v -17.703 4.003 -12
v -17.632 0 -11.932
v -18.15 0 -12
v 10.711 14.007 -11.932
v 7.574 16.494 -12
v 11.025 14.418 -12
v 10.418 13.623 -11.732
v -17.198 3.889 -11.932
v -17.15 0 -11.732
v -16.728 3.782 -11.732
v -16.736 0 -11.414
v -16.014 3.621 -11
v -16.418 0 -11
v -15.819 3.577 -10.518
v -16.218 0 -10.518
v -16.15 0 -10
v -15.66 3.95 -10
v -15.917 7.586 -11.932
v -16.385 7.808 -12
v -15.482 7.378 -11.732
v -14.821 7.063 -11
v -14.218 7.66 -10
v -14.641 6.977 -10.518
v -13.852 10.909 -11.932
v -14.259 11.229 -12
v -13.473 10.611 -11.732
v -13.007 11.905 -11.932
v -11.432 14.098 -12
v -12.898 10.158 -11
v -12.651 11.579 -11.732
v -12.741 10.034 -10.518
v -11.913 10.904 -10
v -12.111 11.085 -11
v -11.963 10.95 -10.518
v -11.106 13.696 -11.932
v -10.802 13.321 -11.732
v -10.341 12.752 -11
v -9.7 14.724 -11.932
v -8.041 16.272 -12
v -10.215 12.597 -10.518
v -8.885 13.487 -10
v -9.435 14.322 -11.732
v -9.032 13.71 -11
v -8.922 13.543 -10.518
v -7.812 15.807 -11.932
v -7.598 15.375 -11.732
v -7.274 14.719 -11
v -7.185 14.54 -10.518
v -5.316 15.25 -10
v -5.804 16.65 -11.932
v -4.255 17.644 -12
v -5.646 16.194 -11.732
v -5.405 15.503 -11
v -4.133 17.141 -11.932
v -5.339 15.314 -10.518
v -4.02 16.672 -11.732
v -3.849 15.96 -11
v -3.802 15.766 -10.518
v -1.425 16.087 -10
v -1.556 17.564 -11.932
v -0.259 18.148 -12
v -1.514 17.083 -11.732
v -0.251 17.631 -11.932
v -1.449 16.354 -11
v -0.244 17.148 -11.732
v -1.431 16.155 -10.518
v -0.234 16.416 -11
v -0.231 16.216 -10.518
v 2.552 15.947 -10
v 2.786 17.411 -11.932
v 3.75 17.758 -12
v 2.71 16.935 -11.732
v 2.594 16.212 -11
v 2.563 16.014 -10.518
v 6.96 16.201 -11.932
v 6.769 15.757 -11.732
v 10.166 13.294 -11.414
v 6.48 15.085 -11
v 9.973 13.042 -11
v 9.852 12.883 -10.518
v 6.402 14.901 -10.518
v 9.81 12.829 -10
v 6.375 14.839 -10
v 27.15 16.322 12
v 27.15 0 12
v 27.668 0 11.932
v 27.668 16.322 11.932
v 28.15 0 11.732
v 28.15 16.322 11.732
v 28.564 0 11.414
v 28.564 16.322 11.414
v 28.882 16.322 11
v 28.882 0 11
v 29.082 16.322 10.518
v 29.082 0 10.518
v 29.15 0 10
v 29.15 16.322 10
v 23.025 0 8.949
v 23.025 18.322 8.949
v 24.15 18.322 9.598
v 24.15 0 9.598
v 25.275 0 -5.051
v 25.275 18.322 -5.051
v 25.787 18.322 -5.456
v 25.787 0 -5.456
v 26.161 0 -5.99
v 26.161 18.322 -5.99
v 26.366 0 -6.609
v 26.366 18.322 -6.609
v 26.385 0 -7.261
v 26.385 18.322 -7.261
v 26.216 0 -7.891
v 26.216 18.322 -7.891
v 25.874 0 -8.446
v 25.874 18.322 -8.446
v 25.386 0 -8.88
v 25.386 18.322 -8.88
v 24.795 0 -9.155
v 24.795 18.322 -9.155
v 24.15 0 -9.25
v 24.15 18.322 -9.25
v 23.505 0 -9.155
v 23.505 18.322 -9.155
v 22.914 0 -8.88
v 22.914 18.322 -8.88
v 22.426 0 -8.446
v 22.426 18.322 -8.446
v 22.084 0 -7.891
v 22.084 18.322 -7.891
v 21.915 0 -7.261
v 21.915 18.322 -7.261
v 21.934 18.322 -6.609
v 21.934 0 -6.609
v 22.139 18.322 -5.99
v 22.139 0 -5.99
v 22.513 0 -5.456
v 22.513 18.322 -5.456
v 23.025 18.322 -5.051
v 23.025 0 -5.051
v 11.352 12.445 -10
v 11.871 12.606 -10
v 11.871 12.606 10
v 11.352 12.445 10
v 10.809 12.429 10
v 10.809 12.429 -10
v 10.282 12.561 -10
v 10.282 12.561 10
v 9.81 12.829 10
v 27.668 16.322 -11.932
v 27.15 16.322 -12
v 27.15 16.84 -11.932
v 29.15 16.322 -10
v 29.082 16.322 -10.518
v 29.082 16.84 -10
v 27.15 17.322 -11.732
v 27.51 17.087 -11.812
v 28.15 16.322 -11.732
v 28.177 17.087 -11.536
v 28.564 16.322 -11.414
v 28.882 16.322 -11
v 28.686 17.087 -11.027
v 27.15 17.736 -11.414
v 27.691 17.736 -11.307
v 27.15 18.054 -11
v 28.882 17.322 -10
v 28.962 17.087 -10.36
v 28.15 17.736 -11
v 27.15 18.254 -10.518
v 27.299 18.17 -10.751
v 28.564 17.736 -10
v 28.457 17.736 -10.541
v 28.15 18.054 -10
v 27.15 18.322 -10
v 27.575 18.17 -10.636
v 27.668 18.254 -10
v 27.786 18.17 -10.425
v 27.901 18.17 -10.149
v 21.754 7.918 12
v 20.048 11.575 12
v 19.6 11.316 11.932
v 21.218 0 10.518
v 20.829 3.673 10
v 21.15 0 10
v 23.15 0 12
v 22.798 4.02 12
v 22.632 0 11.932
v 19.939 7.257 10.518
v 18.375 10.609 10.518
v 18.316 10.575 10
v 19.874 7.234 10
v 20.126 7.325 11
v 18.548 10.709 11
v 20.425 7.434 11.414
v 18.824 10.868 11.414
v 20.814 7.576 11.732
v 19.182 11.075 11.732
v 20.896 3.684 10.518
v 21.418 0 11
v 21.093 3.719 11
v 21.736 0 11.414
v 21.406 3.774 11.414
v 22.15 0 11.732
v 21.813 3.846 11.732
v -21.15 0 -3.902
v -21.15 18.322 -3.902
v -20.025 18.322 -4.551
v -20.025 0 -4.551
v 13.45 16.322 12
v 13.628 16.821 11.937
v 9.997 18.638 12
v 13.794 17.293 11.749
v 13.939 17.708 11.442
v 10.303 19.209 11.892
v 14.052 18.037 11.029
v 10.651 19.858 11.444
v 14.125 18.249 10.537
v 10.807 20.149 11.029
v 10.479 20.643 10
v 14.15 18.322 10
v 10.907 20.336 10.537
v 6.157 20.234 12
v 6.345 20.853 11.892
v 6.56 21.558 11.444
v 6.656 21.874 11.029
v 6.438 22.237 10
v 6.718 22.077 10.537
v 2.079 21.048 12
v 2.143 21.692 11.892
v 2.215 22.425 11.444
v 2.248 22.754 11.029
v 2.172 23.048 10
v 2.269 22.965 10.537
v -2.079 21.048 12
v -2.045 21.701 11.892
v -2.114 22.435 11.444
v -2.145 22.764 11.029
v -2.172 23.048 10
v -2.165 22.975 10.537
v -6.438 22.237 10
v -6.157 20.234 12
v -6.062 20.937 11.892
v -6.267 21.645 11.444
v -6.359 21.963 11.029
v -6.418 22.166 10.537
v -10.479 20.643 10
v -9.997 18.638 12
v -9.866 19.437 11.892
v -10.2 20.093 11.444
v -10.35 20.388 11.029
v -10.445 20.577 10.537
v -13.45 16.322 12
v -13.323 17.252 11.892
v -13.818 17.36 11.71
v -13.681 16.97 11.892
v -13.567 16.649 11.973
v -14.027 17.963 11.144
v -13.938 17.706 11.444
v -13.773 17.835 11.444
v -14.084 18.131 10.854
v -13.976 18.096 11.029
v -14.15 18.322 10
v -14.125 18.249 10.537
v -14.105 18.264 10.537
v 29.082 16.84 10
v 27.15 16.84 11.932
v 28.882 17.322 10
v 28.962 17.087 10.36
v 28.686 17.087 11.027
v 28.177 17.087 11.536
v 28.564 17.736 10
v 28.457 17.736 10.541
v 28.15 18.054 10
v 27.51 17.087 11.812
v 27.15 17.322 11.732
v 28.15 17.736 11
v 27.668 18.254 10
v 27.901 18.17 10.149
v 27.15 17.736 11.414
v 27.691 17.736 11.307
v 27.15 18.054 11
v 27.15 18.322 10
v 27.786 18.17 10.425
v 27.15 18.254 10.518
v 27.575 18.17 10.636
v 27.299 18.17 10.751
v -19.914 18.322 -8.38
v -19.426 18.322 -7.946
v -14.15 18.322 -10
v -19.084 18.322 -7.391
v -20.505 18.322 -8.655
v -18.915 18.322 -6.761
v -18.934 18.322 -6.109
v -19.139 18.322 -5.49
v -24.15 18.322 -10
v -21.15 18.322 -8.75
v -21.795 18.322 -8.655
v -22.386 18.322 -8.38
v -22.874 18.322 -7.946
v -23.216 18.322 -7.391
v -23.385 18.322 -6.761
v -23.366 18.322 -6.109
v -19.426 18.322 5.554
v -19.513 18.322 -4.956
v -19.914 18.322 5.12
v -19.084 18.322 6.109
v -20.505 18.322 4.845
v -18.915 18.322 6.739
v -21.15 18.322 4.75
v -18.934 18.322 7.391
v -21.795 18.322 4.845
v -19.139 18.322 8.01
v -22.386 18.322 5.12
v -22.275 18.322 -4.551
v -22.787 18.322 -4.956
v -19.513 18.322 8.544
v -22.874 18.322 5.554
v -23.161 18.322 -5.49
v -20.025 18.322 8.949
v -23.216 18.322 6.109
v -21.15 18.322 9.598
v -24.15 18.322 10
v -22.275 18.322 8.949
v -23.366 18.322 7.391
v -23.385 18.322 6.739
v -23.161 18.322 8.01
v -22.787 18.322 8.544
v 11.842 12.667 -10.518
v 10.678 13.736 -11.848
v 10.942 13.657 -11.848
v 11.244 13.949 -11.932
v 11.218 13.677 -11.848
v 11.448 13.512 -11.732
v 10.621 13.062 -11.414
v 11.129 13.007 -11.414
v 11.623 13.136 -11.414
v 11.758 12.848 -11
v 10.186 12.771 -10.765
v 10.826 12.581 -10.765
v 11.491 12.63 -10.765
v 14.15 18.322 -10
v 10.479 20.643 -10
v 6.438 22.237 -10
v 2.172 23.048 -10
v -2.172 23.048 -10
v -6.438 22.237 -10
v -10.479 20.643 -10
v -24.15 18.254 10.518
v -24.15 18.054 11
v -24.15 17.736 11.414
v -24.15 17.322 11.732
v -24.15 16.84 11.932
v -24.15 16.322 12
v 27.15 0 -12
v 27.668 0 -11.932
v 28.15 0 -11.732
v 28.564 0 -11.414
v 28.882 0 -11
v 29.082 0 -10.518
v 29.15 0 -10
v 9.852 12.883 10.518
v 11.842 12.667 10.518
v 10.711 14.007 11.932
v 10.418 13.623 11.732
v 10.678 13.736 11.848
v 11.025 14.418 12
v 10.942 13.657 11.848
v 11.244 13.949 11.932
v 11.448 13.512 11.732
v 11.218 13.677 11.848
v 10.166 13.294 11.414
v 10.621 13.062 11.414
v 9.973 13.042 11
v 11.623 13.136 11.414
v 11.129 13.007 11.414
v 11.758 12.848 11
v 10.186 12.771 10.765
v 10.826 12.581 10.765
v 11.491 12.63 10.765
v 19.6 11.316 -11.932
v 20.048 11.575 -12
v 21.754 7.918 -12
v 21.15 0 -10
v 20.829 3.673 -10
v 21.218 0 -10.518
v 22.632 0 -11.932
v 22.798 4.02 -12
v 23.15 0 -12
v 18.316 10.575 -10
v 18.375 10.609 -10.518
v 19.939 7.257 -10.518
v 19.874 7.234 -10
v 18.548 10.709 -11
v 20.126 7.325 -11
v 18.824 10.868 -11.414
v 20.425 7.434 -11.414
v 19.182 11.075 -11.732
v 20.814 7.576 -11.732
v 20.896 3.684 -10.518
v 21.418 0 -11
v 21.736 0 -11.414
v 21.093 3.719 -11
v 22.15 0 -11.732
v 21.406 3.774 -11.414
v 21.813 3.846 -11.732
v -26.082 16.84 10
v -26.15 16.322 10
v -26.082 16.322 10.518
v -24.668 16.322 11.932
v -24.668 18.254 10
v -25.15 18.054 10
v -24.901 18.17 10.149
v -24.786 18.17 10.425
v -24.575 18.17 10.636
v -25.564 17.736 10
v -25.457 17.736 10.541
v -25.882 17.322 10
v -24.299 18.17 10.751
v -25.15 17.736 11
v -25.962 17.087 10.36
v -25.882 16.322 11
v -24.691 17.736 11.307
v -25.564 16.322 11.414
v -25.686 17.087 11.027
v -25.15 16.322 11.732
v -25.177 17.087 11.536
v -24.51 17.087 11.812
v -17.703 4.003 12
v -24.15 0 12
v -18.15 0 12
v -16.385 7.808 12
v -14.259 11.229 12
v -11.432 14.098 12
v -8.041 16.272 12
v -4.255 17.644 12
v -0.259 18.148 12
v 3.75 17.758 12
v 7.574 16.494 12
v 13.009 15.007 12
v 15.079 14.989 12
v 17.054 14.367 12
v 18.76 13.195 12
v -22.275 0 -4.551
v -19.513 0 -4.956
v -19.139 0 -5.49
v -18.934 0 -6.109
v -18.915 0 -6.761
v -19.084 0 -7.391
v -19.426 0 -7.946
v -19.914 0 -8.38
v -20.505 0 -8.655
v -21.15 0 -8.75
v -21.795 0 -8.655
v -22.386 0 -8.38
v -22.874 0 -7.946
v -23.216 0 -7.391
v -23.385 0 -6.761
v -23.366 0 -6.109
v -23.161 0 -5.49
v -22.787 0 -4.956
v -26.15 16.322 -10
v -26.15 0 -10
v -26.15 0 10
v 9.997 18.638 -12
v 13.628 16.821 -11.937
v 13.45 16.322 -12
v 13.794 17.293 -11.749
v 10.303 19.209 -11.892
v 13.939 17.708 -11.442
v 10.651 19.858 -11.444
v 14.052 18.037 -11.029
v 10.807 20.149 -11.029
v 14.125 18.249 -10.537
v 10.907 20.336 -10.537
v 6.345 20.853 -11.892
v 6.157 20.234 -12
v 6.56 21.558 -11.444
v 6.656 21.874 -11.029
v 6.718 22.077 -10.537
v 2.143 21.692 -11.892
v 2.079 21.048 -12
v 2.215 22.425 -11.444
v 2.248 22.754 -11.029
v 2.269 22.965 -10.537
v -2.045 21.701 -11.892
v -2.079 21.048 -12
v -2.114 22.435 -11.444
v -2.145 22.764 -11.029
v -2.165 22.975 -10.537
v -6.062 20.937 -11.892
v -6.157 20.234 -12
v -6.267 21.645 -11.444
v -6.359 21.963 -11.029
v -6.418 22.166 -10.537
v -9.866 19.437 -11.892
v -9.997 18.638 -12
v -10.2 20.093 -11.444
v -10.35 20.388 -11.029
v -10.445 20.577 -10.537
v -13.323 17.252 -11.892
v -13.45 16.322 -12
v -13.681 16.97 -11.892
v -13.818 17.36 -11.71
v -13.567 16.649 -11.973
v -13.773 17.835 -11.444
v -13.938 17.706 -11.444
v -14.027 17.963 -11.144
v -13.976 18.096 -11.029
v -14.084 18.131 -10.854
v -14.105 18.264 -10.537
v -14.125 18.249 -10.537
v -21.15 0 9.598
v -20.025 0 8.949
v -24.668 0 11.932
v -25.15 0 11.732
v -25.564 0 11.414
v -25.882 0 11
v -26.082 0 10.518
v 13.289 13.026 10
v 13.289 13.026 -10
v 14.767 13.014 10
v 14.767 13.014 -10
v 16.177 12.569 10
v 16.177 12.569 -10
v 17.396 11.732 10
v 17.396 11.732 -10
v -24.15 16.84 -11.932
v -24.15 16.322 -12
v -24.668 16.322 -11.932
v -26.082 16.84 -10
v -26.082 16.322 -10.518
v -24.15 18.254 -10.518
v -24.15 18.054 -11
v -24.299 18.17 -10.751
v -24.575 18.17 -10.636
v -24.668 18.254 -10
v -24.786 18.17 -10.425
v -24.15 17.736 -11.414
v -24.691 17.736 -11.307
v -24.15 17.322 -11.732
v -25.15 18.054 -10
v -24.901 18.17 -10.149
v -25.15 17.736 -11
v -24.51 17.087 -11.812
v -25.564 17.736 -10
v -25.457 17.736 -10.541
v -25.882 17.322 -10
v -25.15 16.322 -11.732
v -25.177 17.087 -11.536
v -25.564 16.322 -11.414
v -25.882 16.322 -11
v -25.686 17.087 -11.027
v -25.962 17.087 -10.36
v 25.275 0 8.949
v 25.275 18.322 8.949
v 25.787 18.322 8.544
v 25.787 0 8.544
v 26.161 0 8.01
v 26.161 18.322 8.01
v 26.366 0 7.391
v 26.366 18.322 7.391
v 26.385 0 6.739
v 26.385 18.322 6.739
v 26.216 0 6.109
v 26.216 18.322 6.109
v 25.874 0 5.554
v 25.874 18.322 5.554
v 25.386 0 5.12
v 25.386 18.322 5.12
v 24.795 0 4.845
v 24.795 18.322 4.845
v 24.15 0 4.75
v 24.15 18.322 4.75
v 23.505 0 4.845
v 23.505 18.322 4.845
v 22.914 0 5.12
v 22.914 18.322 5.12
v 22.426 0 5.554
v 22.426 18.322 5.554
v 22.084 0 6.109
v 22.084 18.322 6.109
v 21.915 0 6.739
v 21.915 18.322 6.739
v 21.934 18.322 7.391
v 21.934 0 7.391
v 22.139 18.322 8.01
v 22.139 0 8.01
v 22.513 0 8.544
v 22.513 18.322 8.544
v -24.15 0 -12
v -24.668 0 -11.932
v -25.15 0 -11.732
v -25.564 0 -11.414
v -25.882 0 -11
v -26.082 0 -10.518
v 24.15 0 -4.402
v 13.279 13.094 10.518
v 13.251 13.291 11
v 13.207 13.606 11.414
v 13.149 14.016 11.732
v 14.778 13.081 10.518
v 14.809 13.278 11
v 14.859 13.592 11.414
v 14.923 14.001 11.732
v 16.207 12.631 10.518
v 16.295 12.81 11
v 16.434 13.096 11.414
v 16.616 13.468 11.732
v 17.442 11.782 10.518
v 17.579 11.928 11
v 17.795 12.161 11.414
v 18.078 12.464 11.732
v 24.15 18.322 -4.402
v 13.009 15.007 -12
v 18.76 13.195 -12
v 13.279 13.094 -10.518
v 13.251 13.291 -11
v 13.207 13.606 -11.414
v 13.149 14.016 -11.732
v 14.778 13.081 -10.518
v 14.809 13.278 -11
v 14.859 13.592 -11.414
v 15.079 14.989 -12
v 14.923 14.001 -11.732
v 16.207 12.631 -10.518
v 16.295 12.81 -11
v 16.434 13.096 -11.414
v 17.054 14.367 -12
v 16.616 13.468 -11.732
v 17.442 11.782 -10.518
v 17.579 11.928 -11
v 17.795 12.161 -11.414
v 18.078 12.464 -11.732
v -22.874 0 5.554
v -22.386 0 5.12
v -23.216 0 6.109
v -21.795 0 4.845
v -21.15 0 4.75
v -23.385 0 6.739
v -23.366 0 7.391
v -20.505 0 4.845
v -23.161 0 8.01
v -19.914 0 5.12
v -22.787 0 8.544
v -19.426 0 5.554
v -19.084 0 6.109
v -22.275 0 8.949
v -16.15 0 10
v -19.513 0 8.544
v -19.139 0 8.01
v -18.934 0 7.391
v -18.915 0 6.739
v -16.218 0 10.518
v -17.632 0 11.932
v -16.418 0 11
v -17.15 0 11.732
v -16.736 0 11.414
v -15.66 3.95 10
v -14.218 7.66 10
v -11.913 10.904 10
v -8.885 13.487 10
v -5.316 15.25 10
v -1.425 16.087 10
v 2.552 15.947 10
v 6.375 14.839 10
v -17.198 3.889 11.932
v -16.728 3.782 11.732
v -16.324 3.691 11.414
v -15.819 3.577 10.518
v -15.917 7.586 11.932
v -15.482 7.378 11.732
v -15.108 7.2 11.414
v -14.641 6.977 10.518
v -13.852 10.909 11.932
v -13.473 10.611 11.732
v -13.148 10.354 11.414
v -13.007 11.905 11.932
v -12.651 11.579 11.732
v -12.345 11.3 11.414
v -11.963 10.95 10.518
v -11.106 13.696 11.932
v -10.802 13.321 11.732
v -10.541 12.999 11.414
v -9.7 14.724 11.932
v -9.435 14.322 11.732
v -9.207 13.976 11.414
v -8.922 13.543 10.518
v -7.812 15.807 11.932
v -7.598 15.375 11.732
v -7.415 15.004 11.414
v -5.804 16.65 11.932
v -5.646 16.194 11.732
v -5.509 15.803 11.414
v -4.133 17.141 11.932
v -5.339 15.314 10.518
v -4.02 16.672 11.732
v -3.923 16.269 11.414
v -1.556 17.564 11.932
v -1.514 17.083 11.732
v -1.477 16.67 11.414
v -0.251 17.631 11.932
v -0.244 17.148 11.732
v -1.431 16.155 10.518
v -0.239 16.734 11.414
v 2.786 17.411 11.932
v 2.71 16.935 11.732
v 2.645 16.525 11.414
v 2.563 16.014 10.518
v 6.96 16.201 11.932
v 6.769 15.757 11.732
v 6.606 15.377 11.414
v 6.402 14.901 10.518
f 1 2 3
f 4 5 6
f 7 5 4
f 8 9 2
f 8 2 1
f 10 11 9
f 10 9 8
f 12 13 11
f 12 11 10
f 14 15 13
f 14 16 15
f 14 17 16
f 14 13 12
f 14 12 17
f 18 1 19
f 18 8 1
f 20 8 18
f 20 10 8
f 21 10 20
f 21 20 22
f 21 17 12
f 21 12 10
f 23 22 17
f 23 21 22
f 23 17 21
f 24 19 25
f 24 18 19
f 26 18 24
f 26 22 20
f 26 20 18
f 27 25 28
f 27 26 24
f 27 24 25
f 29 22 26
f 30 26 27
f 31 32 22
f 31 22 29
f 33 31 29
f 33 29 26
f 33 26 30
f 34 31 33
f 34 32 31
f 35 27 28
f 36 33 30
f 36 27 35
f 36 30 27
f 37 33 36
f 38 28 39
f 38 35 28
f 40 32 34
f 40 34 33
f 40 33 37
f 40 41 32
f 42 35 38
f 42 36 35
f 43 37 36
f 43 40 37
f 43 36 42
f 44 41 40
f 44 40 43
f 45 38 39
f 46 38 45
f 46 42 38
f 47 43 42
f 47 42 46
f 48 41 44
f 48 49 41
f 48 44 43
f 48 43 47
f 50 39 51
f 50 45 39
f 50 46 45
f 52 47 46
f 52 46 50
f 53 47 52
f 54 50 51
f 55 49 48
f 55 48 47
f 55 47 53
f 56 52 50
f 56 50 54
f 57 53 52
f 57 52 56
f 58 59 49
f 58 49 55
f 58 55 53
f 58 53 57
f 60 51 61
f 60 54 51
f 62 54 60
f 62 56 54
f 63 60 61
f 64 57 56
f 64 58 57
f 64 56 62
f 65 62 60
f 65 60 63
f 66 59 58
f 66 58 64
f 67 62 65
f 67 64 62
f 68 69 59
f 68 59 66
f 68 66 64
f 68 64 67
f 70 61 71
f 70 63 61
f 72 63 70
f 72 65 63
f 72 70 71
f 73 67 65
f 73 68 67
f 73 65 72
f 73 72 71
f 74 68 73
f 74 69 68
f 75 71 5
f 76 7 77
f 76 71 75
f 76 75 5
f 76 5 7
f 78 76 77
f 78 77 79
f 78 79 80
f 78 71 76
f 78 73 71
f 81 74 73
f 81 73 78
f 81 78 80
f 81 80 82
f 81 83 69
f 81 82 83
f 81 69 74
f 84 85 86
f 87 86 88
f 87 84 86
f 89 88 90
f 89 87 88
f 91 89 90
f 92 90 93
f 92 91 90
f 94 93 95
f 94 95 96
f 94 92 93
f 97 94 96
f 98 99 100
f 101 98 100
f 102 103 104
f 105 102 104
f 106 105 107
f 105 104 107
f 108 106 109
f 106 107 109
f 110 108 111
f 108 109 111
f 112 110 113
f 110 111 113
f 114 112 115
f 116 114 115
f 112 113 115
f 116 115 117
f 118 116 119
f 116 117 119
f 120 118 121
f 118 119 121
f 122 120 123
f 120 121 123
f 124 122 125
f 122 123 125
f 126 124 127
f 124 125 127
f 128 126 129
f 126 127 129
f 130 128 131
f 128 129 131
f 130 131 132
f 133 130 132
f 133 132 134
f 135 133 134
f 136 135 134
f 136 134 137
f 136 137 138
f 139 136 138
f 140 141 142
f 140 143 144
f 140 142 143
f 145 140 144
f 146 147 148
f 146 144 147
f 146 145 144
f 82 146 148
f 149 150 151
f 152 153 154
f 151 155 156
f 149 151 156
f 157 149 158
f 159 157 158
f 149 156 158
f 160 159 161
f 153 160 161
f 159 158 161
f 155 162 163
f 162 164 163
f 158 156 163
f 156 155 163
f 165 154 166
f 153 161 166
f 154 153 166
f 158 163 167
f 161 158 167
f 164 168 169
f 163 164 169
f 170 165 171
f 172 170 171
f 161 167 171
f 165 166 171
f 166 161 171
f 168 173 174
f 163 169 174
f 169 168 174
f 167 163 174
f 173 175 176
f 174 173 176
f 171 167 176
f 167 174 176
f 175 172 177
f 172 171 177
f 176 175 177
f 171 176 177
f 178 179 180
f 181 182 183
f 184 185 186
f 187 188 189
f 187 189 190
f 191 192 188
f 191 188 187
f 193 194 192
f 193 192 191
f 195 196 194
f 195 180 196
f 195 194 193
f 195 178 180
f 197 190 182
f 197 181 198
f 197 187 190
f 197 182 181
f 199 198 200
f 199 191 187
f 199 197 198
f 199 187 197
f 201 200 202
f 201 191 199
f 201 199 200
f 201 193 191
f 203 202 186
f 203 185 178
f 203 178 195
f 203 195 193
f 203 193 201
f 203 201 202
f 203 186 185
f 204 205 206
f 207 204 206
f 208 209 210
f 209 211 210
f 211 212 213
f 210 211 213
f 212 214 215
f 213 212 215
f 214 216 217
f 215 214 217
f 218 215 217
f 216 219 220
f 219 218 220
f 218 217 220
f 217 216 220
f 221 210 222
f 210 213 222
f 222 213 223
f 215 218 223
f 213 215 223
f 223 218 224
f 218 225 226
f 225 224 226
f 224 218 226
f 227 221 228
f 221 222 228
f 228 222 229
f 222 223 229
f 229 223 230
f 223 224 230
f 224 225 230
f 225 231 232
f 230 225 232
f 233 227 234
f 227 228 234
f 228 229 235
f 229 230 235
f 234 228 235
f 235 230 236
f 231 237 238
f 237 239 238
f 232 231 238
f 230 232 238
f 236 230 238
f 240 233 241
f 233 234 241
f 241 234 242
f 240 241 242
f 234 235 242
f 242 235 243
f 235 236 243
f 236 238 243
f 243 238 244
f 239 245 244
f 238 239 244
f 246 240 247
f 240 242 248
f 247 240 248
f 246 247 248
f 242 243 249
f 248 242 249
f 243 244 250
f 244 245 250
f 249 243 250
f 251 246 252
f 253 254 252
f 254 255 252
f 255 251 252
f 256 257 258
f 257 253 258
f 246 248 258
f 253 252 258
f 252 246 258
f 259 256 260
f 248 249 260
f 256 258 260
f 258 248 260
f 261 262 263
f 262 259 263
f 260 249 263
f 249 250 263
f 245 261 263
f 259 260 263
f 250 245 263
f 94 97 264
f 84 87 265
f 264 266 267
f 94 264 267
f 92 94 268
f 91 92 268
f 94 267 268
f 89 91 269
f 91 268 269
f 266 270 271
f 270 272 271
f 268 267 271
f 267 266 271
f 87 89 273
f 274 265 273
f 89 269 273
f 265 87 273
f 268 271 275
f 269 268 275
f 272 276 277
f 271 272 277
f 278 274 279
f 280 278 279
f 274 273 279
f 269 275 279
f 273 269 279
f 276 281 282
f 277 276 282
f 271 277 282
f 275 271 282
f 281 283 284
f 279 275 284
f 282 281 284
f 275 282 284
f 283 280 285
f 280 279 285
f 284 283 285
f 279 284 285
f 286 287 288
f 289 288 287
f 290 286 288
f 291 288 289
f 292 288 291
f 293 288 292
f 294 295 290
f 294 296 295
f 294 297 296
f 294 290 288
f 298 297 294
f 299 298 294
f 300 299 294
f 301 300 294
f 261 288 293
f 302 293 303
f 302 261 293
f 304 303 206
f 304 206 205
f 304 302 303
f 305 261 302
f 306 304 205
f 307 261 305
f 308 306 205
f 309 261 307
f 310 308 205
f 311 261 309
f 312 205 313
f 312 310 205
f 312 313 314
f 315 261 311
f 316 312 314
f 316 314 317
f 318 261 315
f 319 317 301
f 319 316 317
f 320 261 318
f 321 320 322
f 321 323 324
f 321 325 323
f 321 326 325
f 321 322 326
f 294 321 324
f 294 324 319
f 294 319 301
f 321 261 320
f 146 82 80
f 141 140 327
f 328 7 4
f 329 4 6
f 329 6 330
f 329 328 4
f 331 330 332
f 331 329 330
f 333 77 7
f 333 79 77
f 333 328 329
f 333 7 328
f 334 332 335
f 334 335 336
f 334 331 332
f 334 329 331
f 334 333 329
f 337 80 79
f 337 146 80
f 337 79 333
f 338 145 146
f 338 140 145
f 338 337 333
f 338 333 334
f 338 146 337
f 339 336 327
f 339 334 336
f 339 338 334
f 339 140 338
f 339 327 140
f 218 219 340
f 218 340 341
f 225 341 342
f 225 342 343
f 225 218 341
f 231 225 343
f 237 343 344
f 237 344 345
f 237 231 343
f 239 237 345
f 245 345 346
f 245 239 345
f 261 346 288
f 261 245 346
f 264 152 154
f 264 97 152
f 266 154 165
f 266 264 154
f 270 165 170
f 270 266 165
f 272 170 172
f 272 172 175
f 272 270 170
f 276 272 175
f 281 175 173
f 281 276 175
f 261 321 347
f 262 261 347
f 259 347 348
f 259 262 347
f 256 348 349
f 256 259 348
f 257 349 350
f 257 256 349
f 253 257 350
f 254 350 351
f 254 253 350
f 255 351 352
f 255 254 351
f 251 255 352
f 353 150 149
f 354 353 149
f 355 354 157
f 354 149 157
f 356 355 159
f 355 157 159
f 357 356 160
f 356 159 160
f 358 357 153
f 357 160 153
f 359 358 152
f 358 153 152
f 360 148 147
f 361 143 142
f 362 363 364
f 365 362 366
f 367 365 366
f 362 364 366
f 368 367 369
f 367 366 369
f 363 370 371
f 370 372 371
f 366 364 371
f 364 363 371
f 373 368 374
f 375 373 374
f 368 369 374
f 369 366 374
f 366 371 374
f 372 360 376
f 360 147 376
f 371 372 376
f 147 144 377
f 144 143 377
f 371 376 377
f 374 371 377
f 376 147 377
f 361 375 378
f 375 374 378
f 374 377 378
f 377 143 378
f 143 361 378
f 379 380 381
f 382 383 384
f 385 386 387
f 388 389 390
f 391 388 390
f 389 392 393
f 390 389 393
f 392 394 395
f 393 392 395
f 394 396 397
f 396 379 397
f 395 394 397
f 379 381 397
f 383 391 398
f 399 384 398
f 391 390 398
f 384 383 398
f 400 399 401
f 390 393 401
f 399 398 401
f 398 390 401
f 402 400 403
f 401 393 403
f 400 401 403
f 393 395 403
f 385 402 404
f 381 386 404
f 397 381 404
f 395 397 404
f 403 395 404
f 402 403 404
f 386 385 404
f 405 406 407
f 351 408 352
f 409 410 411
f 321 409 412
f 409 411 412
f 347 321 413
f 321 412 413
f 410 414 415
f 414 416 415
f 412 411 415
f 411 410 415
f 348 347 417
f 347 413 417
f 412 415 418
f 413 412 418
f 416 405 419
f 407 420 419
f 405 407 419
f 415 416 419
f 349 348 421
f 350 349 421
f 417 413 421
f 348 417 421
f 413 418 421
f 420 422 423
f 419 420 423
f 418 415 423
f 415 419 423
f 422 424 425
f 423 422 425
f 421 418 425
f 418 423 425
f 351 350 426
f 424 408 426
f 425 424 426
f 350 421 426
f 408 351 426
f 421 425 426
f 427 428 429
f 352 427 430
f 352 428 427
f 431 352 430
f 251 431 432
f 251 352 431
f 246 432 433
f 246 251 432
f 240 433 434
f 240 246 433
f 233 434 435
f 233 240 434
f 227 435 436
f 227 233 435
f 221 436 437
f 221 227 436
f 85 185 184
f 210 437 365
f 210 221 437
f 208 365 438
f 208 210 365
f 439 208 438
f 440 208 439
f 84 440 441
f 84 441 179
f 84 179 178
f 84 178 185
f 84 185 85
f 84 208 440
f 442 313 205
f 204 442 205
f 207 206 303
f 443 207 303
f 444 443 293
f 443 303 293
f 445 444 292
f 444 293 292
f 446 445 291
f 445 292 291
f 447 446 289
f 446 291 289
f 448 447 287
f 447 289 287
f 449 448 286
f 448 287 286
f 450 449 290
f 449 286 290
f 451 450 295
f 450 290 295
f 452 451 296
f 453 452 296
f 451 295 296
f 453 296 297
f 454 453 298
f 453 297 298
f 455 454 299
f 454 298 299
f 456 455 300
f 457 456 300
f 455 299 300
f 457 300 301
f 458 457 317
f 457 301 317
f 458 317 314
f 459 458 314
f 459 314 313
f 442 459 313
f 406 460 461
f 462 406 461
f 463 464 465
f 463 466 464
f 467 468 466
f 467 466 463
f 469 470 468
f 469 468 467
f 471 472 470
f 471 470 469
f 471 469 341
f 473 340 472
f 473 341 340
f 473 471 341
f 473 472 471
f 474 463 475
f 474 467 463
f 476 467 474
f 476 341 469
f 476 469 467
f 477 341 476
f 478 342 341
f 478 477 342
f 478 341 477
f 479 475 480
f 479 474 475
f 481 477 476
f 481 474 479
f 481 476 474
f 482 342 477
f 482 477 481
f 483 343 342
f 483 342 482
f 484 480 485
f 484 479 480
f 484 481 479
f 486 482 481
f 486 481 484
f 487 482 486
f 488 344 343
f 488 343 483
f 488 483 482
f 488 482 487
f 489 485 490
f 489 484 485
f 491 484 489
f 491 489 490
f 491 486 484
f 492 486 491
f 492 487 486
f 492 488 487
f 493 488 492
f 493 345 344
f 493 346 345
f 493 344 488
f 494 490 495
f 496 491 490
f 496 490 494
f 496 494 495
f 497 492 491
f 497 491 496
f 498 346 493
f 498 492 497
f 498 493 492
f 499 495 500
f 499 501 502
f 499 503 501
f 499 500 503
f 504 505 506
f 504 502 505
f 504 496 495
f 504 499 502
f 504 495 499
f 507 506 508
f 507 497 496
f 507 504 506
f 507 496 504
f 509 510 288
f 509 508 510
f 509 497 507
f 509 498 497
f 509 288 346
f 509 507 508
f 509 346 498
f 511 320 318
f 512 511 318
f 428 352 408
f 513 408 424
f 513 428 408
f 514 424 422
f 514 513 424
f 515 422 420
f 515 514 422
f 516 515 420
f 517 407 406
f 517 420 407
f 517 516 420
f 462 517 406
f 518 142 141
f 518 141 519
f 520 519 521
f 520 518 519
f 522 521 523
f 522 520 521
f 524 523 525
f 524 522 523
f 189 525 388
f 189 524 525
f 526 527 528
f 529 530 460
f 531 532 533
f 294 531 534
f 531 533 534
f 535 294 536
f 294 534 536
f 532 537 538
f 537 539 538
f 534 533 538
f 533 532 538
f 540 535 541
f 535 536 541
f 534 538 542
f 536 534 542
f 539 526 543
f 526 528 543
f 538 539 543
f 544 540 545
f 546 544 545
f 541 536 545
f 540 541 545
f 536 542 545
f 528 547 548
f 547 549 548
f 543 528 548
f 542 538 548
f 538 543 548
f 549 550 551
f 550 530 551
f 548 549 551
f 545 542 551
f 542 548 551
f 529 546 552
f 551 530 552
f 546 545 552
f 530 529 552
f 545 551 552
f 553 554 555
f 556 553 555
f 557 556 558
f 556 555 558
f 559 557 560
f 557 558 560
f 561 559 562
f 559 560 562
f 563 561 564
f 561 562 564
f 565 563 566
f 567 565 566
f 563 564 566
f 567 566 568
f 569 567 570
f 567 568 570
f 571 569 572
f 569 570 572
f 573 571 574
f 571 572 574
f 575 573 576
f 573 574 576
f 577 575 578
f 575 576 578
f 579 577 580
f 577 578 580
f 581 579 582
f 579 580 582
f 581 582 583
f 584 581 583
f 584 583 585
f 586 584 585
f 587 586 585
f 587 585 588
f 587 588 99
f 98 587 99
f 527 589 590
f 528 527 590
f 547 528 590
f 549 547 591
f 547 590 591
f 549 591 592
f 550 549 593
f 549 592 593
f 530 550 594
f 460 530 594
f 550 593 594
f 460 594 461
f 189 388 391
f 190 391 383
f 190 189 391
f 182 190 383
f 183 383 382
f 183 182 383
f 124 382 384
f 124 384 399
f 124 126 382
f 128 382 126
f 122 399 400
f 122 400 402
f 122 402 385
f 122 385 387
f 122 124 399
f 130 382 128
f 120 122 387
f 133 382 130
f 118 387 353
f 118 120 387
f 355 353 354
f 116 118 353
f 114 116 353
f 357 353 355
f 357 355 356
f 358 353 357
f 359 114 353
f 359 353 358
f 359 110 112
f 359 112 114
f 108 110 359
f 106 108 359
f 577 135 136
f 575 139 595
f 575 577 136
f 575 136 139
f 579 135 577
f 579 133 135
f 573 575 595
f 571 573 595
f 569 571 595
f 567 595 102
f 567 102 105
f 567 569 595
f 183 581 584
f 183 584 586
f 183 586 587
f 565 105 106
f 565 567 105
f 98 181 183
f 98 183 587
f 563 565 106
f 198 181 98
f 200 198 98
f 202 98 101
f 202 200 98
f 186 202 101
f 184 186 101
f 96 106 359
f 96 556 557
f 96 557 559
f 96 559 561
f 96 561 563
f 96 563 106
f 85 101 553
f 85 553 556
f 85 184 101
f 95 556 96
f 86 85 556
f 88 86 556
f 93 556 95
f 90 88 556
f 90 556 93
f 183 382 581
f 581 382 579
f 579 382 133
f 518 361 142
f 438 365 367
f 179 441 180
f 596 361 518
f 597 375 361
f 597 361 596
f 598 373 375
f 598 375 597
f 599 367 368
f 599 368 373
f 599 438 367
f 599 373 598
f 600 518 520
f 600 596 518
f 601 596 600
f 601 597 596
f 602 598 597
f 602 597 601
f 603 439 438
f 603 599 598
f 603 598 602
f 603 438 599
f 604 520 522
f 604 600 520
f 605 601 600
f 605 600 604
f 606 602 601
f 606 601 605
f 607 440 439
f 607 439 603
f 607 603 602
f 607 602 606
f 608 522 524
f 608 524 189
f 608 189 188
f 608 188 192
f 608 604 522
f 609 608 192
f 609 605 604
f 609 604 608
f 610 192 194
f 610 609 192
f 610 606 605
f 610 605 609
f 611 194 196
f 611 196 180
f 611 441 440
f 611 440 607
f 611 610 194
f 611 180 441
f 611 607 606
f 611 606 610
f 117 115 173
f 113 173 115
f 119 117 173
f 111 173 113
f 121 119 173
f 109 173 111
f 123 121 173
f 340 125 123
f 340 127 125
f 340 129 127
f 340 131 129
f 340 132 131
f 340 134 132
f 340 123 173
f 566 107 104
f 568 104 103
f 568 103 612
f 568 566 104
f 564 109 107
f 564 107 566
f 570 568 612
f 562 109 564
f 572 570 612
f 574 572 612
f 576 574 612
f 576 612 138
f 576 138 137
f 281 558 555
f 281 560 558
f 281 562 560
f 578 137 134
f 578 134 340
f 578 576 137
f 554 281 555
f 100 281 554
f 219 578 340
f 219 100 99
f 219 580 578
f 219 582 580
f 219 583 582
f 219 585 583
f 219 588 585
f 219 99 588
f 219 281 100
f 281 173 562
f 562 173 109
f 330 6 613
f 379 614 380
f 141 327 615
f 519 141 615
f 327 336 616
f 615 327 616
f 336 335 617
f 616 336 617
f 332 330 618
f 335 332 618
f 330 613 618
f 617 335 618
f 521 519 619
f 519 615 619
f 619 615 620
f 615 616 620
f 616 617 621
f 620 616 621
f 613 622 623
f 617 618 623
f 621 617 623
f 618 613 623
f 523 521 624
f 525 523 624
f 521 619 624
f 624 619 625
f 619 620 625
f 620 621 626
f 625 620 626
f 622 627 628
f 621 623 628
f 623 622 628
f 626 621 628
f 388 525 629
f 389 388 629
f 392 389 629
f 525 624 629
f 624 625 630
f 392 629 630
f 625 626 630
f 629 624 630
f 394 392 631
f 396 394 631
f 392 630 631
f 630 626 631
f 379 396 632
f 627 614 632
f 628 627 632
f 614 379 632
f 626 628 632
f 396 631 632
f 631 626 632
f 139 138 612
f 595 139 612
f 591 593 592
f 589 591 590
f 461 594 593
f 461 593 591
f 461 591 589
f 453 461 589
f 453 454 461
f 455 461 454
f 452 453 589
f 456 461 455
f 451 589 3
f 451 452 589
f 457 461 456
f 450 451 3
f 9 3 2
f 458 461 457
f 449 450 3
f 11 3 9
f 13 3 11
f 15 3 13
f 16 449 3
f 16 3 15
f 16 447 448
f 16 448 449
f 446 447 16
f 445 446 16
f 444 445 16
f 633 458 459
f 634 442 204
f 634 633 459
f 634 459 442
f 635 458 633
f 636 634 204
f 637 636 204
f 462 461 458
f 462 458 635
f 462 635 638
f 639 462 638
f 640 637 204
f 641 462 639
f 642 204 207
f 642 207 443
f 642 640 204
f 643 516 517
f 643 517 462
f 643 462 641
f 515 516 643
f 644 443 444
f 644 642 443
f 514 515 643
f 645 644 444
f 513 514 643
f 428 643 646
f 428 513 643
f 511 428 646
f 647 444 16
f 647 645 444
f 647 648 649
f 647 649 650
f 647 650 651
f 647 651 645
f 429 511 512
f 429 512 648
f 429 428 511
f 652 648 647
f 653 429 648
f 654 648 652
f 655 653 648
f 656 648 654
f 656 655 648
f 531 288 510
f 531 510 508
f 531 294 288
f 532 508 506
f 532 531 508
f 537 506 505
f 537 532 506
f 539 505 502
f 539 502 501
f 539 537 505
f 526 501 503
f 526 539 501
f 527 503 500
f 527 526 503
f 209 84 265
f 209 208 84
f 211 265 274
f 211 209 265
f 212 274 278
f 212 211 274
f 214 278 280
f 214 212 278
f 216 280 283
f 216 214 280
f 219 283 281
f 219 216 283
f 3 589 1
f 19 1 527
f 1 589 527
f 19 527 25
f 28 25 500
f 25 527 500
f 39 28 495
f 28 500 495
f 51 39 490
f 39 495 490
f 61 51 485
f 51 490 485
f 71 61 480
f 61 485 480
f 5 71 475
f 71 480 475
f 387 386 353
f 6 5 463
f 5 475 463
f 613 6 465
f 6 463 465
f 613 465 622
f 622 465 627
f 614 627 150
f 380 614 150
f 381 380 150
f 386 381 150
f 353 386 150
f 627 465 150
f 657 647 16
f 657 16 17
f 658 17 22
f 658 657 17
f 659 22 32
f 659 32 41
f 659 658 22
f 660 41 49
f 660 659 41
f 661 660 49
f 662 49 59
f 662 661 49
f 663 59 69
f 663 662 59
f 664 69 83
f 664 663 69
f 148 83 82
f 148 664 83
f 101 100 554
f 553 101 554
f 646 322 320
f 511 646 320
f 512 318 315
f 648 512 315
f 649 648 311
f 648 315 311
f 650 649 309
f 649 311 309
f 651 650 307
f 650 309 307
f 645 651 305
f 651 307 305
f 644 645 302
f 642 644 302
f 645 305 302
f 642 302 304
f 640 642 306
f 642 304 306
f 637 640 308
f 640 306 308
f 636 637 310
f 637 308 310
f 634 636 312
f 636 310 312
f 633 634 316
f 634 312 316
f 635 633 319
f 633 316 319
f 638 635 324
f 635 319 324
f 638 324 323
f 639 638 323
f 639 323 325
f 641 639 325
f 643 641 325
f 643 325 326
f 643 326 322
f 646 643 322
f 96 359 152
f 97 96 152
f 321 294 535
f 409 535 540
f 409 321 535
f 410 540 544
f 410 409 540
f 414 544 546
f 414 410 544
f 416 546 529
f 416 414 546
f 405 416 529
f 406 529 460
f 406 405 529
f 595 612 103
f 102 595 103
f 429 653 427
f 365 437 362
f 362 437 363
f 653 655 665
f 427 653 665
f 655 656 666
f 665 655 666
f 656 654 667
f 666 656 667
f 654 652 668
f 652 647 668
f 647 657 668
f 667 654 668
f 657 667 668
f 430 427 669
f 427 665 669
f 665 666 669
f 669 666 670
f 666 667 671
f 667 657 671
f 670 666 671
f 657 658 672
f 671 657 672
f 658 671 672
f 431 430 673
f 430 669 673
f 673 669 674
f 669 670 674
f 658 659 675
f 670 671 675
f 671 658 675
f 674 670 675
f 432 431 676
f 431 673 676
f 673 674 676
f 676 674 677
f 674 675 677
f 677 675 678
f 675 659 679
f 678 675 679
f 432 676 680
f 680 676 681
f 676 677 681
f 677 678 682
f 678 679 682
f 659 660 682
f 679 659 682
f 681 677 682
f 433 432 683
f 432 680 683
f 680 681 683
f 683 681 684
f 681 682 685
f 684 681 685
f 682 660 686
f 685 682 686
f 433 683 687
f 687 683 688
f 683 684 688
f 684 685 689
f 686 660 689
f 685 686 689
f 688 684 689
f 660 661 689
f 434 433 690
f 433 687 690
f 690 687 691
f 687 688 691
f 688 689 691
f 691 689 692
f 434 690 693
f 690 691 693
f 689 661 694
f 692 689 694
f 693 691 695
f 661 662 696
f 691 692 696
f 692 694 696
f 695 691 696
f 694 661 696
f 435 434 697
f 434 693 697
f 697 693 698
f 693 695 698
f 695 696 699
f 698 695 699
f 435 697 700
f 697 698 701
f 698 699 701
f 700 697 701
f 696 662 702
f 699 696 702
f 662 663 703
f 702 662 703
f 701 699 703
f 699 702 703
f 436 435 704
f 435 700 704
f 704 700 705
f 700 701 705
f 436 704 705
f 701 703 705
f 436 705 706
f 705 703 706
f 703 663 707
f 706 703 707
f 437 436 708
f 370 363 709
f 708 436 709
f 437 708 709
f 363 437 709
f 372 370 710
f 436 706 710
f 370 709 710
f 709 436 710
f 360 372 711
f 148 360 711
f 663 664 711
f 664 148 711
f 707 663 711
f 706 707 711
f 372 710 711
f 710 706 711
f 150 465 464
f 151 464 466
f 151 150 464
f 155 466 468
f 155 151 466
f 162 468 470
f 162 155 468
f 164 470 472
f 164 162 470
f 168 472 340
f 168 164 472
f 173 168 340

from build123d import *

# Parameters (mm, degrees)
AUFSATZ_LINEAR_AUSTRAGEN1_DEPTH = 12
SCHNITT_LINEAR_AUSTRAGEN1_DEPTH = 37.46124655
SCHNITT_LINEAR_AUSTRAGEN2_DEPTH = 37.46124655
SCHNITT_LINEAR_AUSTRAGEN3_DEPTH = 37.46124655
VERRUNDUNG1_R                   = 2
VERRUNDUNG2_R                   = 2


with BuildPart() as part:
    # Skizze1 → Aufsatz-Linear austragen1 (new, symmetric)
    with BuildSketch(Plane.XY):
        with BuildLine():
            ThreePointArc((18.31643729, 10.575), (20.429331226, 5.474022804), (21.15, 0))
            Line((21.15, 0), (29.15, 0))
            Line((29.15, 0), (29.15, 18.322117782))
            Line((29.15, 18.322117782), (14.15, 18.322117782))
            ThreePointArc((14.15, 18.322117782), (0, 23.15), (-14.15, 18.322117782))
            Line((-14.15, 18.322117782), (-26.15, 18.322117782))
            Line((-26.15, 18.322117782), (-26.15, 0))
            Line((-26.15, 0), (-16.15, 0))
            ThreePointArc((-16.15, 0), (-6.544357391, 14.764616024), (10.846146915, 11.965934861))
            ThreePointArc((10.846146915, 11.965934861), (14.901557957, 12.990518454), (18.31643729, 10.575))
        make_face()
    extrude(amount=AUFSATZ_LINEAR_AUSTRAGEN1_DEPTH, both=True)

    # Skizze2 → Schnitt-Linear austragen1 (cut, through all)
    with BuildSketch(Plane(origin=(0, 18.322117782, 0), x_dir=(1, 0, 0), z_dir=(0, 1, 0))):
        with BuildLine():
            Line((-22.275, 4.551442841), (-21.15, 3.901923789))
            Line((-21.15, 3.901923789), (-20.025, 4.551442841))
            ThreePointArc((-20.025, 4.551442841), (-21.15, 8.75), (-22.275, 4.551442841))
        make_face()
    extrude(amount=-SCHNITT_LINEAR_AUSTRAGEN1_DEPTH, mode=Mode.SUBTRACT)

    # Skizze2<4> → Schnitt-Linear austragen2 (cut, through all)
    with BuildSketch(Plane(origin=(0, 18.322117782, 0), x_dir=(1, 0, 0), z_dir=(0, 1, 0))):
        with BuildLine():
            Line((23.025, 5.051442841), (24.15, 4.401923789))
            Line((24.15, 4.401923789), (25.275, 5.051442841))
            ThreePointArc((25.275, 5.051442841), (24.15, 9.25), (23.025, 5.051442841))
        make_face()
    extrude(amount=-SCHNITT_LINEAR_AUSTRAGEN2_DEPTH, mode=Mode.SUBTRACT)

    # Skizze2<5> → Schnitt-Linear austragen3 (cut, through all)
    with BuildSketch(Plane(origin=(0, 18.322117782, 0), x_dir=(1, 0, 0), z_dir=(0, 1, 0))):
        with BuildLine():
            Line((24.15, -9.598076211), (25.275, -8.948557159))
            ThreePointArc((25.275, -8.948557159), (24.15, -4.75), (23.025, -8.948557159))
            Line((23.025, -8.948557159), (24.15, -9.598076211))
        make_face()
        with BuildLine():
            Line((-22.275, -8.948557159), (-21.15, -9.598076211))
            Line((-21.15, -9.598076211), (-20.025, -8.948557159))
            ThreePointArc((-20.025, -8.948557159), (-21.15, -4.75), (-22.275, -8.948557159))
        make_face()
    extrude(amount=-SCHNITT_LINEAR_AUSTRAGEN3_DEPTH, mode=Mode.SUBTRACT)

    # Verrundung1
    verrundung1_edges = [part.edges().sort_by_distance(p)[0] for p in [
        (20.429331226, 5.474022804, 12),
        (20.429331226, 5.474022804, -12),
        (10.846146915, 11.965934861, 0),
        (14.901557957, 12.990518454, 12),
        (14.901557957, 12.990518454, -12),
        (29.15, 9.161058891, -12),
        (29.15, 9.161058891, 12),
        (-26.15, 9.161058891, -12),
        (-26.15, 9.161058891, 12),
        (-6.544357391, 14.764616024, -12),
        (-6.544357391, 14.764616024, 12),
    ]]
    fillet(verrundung1_edges, radius=VERRUNDUNG1_R)

    # Verrundung2
    verrundung2_edges = [part.edges().sort_by_distance(p)[0] for p in [
        (20.65, 18.322117782, 12),
        (28.564213562, 18.322117782, 11.414213562),
        (20.65, 18.322117782, -12),
        (28.564213562, 18.322117782, -11.414213562),
        (-19.15, 18.322117782, 12),
        (-25.564213562, 18.322117782, 11.414213562),
        (-19.15, 18.322117782, -12),
        (-25.564213562, 18.322117782, -11.414213562),
        (0, 23.15, -12),
        (0, 23.15, 12),
        (29.15, 18.322117782, 0),
        (-26.15, 18.322117782, 0),
    ]]
    fillet(verrundung2_edges, radius=VERRUNDUNG2_R)


solid = part.part
